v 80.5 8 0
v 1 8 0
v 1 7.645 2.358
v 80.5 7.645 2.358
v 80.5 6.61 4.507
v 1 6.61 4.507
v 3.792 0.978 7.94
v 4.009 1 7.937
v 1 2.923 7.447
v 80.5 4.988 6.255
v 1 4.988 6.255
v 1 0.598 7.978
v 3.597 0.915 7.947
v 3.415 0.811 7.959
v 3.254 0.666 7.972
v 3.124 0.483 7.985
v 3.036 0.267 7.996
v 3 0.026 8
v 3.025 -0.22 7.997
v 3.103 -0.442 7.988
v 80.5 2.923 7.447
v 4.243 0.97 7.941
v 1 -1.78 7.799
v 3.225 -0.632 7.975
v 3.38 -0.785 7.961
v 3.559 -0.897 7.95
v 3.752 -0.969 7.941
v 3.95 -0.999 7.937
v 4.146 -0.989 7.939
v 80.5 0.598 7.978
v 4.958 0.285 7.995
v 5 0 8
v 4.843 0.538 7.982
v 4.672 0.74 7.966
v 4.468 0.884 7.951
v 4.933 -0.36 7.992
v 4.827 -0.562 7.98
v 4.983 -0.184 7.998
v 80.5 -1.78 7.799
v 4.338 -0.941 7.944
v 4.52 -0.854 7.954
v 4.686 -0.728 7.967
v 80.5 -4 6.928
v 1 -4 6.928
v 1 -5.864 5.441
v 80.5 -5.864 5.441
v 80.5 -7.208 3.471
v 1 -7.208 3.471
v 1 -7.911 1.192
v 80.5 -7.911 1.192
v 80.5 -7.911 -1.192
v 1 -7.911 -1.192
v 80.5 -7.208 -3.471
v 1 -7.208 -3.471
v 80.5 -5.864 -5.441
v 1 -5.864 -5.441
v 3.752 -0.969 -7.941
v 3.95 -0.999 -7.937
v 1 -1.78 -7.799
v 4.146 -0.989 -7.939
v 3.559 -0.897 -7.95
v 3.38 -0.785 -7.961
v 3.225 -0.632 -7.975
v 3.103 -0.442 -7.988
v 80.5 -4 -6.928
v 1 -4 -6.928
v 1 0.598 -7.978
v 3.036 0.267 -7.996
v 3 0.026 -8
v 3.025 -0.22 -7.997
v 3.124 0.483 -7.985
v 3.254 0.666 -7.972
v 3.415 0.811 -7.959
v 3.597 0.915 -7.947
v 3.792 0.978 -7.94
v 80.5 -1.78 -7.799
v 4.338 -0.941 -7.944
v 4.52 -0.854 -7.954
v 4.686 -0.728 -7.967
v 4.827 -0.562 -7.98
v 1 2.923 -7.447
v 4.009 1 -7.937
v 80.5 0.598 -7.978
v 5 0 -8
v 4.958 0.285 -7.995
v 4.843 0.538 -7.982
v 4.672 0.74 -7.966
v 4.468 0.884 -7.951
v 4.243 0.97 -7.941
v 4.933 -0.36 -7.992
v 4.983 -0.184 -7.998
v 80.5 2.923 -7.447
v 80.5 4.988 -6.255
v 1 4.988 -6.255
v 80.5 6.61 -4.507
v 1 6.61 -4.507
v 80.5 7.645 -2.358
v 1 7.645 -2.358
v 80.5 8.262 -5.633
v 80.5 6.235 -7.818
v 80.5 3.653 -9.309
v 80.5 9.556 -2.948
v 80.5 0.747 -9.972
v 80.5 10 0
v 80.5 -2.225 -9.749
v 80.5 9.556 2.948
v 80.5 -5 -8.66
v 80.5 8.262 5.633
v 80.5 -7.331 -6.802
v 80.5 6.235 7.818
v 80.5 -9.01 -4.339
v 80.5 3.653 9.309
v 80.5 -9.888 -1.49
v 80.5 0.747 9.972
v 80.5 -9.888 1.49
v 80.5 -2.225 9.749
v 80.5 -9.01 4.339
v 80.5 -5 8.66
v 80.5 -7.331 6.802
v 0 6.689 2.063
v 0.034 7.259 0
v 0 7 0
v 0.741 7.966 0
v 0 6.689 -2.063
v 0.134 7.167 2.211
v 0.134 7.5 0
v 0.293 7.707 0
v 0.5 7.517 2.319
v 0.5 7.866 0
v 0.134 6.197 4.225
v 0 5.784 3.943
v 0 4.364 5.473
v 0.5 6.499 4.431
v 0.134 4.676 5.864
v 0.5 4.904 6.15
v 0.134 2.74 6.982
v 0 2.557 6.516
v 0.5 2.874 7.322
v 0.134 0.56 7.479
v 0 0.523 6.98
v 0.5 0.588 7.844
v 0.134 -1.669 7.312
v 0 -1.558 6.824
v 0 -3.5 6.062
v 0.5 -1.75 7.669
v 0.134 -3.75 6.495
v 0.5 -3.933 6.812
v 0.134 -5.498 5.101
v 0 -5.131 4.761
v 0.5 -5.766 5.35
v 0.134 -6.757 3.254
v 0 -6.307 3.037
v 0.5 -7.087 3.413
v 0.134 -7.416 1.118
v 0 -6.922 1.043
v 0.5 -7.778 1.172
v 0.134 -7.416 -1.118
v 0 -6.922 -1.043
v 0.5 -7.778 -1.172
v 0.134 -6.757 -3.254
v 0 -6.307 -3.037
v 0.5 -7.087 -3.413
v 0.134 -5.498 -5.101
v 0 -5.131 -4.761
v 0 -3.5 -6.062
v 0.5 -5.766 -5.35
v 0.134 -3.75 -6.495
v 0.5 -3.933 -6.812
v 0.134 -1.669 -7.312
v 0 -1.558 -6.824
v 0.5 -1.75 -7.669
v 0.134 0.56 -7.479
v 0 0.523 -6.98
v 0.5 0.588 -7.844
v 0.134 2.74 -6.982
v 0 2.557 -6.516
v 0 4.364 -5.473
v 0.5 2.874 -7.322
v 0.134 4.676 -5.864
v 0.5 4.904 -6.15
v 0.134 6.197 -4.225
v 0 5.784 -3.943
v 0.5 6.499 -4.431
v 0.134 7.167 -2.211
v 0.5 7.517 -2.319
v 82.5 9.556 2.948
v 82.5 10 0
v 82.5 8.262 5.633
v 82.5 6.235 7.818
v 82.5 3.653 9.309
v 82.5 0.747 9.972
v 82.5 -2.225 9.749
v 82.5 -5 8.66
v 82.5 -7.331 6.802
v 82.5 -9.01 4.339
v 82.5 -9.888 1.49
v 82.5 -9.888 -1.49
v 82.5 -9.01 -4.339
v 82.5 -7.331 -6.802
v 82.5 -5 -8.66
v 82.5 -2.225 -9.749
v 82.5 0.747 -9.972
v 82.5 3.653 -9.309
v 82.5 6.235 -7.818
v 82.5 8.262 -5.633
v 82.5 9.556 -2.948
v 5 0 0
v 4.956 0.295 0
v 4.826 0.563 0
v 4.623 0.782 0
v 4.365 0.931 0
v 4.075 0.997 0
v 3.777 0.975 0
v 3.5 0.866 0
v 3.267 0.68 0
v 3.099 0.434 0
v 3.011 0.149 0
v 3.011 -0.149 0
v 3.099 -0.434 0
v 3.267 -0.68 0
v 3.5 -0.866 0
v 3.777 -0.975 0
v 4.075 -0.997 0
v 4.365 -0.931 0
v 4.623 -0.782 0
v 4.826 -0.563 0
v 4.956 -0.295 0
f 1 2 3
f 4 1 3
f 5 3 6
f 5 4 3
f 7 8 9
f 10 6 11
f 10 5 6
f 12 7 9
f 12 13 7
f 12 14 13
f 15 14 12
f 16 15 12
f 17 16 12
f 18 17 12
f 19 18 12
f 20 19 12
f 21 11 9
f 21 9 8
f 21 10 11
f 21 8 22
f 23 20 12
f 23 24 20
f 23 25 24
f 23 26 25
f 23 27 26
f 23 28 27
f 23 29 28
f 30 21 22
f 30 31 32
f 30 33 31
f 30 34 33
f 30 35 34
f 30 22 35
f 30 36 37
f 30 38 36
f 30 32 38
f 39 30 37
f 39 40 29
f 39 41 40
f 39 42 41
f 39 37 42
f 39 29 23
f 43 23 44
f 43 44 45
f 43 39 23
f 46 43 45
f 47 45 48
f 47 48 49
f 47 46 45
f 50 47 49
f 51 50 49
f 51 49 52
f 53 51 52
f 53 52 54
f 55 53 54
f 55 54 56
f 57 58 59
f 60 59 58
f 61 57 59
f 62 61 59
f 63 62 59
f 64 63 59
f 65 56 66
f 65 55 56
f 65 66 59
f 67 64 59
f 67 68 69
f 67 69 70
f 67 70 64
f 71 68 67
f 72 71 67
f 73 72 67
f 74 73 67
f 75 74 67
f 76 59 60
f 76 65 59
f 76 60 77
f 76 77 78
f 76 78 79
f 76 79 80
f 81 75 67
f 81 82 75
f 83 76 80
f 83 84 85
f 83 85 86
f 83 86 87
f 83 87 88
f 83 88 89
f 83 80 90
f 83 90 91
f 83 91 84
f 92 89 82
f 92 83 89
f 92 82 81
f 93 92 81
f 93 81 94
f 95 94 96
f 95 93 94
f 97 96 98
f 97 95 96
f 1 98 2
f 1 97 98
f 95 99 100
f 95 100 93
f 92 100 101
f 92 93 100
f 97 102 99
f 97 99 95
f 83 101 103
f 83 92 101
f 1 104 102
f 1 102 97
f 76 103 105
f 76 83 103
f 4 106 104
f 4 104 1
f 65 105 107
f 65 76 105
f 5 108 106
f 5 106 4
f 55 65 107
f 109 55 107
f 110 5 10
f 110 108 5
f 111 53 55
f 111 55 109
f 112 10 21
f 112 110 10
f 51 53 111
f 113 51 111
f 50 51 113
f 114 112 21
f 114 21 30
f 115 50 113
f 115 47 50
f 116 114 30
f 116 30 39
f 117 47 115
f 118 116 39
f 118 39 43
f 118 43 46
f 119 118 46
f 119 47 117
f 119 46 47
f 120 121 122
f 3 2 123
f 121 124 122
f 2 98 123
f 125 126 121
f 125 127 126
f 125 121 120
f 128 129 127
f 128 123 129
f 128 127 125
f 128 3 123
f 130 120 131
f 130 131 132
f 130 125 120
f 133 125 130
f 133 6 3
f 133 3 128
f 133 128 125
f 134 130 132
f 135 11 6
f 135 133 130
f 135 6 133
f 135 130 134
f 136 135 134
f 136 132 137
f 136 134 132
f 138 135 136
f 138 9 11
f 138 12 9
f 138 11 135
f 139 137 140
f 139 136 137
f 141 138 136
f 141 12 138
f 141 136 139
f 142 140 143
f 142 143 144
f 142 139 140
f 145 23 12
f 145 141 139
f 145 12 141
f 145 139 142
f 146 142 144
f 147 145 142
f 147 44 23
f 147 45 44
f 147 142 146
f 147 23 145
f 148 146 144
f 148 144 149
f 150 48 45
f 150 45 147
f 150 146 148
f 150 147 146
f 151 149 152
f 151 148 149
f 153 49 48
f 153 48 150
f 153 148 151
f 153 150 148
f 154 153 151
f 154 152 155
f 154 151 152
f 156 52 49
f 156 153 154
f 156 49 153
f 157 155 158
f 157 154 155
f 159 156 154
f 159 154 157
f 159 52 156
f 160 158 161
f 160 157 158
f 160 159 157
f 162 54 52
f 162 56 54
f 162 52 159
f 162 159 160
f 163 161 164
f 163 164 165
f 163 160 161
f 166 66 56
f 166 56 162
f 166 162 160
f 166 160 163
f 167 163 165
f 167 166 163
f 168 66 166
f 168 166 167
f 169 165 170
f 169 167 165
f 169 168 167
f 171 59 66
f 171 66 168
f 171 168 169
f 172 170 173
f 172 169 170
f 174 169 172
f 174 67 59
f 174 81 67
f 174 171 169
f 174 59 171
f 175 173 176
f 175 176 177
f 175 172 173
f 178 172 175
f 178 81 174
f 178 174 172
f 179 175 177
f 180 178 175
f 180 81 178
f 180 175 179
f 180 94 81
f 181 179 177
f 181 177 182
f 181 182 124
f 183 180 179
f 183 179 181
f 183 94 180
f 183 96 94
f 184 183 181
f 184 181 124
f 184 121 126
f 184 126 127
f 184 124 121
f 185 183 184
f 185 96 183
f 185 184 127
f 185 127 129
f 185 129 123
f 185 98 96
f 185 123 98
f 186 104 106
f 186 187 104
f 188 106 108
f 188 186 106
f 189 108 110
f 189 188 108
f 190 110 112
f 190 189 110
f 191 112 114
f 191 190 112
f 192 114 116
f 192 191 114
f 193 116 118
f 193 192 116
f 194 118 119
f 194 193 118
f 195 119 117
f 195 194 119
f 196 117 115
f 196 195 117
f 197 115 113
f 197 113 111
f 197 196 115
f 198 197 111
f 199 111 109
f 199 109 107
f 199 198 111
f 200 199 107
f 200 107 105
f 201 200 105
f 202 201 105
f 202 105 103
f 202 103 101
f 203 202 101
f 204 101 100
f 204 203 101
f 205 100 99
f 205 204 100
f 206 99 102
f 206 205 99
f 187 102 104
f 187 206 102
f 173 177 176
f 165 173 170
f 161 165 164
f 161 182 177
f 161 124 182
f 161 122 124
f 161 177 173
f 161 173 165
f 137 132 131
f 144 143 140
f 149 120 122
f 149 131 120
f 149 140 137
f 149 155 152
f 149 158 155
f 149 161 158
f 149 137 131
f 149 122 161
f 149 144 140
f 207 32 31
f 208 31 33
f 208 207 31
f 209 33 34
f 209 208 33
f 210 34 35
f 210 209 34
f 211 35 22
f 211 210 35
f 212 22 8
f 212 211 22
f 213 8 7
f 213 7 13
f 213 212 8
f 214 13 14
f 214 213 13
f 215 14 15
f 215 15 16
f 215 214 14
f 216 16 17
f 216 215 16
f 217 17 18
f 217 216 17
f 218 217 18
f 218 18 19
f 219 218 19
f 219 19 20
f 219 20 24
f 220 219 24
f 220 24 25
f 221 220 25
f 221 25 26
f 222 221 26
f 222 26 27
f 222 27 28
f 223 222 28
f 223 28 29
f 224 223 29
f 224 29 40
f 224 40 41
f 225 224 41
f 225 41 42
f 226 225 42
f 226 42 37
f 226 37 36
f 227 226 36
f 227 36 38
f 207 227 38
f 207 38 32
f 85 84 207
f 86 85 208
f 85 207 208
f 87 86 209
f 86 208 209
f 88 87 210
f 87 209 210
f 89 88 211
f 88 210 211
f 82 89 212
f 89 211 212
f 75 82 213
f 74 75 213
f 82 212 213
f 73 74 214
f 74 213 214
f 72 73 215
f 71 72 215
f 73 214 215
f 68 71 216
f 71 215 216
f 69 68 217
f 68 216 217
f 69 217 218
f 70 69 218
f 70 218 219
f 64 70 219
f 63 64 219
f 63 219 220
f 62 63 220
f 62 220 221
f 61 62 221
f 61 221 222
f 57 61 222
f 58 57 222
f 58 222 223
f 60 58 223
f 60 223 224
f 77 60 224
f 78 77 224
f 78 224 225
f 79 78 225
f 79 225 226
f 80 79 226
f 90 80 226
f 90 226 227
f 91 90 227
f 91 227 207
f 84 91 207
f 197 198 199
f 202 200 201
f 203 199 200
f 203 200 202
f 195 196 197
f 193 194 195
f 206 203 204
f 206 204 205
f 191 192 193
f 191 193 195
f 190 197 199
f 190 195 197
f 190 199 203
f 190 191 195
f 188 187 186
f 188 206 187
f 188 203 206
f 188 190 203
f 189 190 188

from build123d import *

# Parameters (mm, degrees)
SCHNITT_LINEAR_AUSTRAGEN1_REACH             = 12
SKIZZE2_R                                   = 1
SCHNITT_LINEAR_AUSTRAGEN1_DIRECTION_2_DEPTH = 11
VERRUNDUNG1_R                               = 1


with BuildPart() as part:
    # Skizze1 → Rotation1 (revolve)
    with BuildSketch(Plane.XY):
        Polygon((0, 0), (0, 8), (80.5, 8), (80.5, 10), (82.5, 10), (82.5, 0), align=None)
    revolve(axis=Axis((-15.956588212, 0, 0), (1, 0, 0)))

    # Skizze2 → Schnitt-Linear austragen1 (cut, up to next)
    with BuildSketch(Plane.XY, mode=Mode.PRIVATE) as schnitt_linear_austragen1_sk1:
        with Locations((4, 0)):
            Circle(SKIZZE2_R)
    schnitt_linear_austragen1_tool1 = extrude(schnitt_linear_austragen1_sk1.sketch, amount=-SCHNITT_LINEAR_AUSTRAGEN1_REACH, mode=Mode.PRIVATE) & part.part
    add(schnitt_linear_austragen1_tool1.solids().sort_by_distance((4, 0, 0))[0], mode=Mode.SUBTRACT)

    # Skizze2 → Schnitt-Linear austragen1 direction 2 (cut)
    with BuildSketch(Plane.XY):
        with Locations((4, 0)):
            Circle(SKIZZE2_R)
    extrude(amount=SCHNITT_LINEAR_AUSTRAGEN1_DIRECTION_2_DEPTH, mode=Mode.SUBTRACT)

    # Verrundung1
    verrundung1_edges = [part.edges().sort_by_distance(p)[0] for p in [
        (0, -8, 0),
    ]]
    fillet(verrundung1_edges, radius=VERRUNDUNG1_R)


solid = part.part
